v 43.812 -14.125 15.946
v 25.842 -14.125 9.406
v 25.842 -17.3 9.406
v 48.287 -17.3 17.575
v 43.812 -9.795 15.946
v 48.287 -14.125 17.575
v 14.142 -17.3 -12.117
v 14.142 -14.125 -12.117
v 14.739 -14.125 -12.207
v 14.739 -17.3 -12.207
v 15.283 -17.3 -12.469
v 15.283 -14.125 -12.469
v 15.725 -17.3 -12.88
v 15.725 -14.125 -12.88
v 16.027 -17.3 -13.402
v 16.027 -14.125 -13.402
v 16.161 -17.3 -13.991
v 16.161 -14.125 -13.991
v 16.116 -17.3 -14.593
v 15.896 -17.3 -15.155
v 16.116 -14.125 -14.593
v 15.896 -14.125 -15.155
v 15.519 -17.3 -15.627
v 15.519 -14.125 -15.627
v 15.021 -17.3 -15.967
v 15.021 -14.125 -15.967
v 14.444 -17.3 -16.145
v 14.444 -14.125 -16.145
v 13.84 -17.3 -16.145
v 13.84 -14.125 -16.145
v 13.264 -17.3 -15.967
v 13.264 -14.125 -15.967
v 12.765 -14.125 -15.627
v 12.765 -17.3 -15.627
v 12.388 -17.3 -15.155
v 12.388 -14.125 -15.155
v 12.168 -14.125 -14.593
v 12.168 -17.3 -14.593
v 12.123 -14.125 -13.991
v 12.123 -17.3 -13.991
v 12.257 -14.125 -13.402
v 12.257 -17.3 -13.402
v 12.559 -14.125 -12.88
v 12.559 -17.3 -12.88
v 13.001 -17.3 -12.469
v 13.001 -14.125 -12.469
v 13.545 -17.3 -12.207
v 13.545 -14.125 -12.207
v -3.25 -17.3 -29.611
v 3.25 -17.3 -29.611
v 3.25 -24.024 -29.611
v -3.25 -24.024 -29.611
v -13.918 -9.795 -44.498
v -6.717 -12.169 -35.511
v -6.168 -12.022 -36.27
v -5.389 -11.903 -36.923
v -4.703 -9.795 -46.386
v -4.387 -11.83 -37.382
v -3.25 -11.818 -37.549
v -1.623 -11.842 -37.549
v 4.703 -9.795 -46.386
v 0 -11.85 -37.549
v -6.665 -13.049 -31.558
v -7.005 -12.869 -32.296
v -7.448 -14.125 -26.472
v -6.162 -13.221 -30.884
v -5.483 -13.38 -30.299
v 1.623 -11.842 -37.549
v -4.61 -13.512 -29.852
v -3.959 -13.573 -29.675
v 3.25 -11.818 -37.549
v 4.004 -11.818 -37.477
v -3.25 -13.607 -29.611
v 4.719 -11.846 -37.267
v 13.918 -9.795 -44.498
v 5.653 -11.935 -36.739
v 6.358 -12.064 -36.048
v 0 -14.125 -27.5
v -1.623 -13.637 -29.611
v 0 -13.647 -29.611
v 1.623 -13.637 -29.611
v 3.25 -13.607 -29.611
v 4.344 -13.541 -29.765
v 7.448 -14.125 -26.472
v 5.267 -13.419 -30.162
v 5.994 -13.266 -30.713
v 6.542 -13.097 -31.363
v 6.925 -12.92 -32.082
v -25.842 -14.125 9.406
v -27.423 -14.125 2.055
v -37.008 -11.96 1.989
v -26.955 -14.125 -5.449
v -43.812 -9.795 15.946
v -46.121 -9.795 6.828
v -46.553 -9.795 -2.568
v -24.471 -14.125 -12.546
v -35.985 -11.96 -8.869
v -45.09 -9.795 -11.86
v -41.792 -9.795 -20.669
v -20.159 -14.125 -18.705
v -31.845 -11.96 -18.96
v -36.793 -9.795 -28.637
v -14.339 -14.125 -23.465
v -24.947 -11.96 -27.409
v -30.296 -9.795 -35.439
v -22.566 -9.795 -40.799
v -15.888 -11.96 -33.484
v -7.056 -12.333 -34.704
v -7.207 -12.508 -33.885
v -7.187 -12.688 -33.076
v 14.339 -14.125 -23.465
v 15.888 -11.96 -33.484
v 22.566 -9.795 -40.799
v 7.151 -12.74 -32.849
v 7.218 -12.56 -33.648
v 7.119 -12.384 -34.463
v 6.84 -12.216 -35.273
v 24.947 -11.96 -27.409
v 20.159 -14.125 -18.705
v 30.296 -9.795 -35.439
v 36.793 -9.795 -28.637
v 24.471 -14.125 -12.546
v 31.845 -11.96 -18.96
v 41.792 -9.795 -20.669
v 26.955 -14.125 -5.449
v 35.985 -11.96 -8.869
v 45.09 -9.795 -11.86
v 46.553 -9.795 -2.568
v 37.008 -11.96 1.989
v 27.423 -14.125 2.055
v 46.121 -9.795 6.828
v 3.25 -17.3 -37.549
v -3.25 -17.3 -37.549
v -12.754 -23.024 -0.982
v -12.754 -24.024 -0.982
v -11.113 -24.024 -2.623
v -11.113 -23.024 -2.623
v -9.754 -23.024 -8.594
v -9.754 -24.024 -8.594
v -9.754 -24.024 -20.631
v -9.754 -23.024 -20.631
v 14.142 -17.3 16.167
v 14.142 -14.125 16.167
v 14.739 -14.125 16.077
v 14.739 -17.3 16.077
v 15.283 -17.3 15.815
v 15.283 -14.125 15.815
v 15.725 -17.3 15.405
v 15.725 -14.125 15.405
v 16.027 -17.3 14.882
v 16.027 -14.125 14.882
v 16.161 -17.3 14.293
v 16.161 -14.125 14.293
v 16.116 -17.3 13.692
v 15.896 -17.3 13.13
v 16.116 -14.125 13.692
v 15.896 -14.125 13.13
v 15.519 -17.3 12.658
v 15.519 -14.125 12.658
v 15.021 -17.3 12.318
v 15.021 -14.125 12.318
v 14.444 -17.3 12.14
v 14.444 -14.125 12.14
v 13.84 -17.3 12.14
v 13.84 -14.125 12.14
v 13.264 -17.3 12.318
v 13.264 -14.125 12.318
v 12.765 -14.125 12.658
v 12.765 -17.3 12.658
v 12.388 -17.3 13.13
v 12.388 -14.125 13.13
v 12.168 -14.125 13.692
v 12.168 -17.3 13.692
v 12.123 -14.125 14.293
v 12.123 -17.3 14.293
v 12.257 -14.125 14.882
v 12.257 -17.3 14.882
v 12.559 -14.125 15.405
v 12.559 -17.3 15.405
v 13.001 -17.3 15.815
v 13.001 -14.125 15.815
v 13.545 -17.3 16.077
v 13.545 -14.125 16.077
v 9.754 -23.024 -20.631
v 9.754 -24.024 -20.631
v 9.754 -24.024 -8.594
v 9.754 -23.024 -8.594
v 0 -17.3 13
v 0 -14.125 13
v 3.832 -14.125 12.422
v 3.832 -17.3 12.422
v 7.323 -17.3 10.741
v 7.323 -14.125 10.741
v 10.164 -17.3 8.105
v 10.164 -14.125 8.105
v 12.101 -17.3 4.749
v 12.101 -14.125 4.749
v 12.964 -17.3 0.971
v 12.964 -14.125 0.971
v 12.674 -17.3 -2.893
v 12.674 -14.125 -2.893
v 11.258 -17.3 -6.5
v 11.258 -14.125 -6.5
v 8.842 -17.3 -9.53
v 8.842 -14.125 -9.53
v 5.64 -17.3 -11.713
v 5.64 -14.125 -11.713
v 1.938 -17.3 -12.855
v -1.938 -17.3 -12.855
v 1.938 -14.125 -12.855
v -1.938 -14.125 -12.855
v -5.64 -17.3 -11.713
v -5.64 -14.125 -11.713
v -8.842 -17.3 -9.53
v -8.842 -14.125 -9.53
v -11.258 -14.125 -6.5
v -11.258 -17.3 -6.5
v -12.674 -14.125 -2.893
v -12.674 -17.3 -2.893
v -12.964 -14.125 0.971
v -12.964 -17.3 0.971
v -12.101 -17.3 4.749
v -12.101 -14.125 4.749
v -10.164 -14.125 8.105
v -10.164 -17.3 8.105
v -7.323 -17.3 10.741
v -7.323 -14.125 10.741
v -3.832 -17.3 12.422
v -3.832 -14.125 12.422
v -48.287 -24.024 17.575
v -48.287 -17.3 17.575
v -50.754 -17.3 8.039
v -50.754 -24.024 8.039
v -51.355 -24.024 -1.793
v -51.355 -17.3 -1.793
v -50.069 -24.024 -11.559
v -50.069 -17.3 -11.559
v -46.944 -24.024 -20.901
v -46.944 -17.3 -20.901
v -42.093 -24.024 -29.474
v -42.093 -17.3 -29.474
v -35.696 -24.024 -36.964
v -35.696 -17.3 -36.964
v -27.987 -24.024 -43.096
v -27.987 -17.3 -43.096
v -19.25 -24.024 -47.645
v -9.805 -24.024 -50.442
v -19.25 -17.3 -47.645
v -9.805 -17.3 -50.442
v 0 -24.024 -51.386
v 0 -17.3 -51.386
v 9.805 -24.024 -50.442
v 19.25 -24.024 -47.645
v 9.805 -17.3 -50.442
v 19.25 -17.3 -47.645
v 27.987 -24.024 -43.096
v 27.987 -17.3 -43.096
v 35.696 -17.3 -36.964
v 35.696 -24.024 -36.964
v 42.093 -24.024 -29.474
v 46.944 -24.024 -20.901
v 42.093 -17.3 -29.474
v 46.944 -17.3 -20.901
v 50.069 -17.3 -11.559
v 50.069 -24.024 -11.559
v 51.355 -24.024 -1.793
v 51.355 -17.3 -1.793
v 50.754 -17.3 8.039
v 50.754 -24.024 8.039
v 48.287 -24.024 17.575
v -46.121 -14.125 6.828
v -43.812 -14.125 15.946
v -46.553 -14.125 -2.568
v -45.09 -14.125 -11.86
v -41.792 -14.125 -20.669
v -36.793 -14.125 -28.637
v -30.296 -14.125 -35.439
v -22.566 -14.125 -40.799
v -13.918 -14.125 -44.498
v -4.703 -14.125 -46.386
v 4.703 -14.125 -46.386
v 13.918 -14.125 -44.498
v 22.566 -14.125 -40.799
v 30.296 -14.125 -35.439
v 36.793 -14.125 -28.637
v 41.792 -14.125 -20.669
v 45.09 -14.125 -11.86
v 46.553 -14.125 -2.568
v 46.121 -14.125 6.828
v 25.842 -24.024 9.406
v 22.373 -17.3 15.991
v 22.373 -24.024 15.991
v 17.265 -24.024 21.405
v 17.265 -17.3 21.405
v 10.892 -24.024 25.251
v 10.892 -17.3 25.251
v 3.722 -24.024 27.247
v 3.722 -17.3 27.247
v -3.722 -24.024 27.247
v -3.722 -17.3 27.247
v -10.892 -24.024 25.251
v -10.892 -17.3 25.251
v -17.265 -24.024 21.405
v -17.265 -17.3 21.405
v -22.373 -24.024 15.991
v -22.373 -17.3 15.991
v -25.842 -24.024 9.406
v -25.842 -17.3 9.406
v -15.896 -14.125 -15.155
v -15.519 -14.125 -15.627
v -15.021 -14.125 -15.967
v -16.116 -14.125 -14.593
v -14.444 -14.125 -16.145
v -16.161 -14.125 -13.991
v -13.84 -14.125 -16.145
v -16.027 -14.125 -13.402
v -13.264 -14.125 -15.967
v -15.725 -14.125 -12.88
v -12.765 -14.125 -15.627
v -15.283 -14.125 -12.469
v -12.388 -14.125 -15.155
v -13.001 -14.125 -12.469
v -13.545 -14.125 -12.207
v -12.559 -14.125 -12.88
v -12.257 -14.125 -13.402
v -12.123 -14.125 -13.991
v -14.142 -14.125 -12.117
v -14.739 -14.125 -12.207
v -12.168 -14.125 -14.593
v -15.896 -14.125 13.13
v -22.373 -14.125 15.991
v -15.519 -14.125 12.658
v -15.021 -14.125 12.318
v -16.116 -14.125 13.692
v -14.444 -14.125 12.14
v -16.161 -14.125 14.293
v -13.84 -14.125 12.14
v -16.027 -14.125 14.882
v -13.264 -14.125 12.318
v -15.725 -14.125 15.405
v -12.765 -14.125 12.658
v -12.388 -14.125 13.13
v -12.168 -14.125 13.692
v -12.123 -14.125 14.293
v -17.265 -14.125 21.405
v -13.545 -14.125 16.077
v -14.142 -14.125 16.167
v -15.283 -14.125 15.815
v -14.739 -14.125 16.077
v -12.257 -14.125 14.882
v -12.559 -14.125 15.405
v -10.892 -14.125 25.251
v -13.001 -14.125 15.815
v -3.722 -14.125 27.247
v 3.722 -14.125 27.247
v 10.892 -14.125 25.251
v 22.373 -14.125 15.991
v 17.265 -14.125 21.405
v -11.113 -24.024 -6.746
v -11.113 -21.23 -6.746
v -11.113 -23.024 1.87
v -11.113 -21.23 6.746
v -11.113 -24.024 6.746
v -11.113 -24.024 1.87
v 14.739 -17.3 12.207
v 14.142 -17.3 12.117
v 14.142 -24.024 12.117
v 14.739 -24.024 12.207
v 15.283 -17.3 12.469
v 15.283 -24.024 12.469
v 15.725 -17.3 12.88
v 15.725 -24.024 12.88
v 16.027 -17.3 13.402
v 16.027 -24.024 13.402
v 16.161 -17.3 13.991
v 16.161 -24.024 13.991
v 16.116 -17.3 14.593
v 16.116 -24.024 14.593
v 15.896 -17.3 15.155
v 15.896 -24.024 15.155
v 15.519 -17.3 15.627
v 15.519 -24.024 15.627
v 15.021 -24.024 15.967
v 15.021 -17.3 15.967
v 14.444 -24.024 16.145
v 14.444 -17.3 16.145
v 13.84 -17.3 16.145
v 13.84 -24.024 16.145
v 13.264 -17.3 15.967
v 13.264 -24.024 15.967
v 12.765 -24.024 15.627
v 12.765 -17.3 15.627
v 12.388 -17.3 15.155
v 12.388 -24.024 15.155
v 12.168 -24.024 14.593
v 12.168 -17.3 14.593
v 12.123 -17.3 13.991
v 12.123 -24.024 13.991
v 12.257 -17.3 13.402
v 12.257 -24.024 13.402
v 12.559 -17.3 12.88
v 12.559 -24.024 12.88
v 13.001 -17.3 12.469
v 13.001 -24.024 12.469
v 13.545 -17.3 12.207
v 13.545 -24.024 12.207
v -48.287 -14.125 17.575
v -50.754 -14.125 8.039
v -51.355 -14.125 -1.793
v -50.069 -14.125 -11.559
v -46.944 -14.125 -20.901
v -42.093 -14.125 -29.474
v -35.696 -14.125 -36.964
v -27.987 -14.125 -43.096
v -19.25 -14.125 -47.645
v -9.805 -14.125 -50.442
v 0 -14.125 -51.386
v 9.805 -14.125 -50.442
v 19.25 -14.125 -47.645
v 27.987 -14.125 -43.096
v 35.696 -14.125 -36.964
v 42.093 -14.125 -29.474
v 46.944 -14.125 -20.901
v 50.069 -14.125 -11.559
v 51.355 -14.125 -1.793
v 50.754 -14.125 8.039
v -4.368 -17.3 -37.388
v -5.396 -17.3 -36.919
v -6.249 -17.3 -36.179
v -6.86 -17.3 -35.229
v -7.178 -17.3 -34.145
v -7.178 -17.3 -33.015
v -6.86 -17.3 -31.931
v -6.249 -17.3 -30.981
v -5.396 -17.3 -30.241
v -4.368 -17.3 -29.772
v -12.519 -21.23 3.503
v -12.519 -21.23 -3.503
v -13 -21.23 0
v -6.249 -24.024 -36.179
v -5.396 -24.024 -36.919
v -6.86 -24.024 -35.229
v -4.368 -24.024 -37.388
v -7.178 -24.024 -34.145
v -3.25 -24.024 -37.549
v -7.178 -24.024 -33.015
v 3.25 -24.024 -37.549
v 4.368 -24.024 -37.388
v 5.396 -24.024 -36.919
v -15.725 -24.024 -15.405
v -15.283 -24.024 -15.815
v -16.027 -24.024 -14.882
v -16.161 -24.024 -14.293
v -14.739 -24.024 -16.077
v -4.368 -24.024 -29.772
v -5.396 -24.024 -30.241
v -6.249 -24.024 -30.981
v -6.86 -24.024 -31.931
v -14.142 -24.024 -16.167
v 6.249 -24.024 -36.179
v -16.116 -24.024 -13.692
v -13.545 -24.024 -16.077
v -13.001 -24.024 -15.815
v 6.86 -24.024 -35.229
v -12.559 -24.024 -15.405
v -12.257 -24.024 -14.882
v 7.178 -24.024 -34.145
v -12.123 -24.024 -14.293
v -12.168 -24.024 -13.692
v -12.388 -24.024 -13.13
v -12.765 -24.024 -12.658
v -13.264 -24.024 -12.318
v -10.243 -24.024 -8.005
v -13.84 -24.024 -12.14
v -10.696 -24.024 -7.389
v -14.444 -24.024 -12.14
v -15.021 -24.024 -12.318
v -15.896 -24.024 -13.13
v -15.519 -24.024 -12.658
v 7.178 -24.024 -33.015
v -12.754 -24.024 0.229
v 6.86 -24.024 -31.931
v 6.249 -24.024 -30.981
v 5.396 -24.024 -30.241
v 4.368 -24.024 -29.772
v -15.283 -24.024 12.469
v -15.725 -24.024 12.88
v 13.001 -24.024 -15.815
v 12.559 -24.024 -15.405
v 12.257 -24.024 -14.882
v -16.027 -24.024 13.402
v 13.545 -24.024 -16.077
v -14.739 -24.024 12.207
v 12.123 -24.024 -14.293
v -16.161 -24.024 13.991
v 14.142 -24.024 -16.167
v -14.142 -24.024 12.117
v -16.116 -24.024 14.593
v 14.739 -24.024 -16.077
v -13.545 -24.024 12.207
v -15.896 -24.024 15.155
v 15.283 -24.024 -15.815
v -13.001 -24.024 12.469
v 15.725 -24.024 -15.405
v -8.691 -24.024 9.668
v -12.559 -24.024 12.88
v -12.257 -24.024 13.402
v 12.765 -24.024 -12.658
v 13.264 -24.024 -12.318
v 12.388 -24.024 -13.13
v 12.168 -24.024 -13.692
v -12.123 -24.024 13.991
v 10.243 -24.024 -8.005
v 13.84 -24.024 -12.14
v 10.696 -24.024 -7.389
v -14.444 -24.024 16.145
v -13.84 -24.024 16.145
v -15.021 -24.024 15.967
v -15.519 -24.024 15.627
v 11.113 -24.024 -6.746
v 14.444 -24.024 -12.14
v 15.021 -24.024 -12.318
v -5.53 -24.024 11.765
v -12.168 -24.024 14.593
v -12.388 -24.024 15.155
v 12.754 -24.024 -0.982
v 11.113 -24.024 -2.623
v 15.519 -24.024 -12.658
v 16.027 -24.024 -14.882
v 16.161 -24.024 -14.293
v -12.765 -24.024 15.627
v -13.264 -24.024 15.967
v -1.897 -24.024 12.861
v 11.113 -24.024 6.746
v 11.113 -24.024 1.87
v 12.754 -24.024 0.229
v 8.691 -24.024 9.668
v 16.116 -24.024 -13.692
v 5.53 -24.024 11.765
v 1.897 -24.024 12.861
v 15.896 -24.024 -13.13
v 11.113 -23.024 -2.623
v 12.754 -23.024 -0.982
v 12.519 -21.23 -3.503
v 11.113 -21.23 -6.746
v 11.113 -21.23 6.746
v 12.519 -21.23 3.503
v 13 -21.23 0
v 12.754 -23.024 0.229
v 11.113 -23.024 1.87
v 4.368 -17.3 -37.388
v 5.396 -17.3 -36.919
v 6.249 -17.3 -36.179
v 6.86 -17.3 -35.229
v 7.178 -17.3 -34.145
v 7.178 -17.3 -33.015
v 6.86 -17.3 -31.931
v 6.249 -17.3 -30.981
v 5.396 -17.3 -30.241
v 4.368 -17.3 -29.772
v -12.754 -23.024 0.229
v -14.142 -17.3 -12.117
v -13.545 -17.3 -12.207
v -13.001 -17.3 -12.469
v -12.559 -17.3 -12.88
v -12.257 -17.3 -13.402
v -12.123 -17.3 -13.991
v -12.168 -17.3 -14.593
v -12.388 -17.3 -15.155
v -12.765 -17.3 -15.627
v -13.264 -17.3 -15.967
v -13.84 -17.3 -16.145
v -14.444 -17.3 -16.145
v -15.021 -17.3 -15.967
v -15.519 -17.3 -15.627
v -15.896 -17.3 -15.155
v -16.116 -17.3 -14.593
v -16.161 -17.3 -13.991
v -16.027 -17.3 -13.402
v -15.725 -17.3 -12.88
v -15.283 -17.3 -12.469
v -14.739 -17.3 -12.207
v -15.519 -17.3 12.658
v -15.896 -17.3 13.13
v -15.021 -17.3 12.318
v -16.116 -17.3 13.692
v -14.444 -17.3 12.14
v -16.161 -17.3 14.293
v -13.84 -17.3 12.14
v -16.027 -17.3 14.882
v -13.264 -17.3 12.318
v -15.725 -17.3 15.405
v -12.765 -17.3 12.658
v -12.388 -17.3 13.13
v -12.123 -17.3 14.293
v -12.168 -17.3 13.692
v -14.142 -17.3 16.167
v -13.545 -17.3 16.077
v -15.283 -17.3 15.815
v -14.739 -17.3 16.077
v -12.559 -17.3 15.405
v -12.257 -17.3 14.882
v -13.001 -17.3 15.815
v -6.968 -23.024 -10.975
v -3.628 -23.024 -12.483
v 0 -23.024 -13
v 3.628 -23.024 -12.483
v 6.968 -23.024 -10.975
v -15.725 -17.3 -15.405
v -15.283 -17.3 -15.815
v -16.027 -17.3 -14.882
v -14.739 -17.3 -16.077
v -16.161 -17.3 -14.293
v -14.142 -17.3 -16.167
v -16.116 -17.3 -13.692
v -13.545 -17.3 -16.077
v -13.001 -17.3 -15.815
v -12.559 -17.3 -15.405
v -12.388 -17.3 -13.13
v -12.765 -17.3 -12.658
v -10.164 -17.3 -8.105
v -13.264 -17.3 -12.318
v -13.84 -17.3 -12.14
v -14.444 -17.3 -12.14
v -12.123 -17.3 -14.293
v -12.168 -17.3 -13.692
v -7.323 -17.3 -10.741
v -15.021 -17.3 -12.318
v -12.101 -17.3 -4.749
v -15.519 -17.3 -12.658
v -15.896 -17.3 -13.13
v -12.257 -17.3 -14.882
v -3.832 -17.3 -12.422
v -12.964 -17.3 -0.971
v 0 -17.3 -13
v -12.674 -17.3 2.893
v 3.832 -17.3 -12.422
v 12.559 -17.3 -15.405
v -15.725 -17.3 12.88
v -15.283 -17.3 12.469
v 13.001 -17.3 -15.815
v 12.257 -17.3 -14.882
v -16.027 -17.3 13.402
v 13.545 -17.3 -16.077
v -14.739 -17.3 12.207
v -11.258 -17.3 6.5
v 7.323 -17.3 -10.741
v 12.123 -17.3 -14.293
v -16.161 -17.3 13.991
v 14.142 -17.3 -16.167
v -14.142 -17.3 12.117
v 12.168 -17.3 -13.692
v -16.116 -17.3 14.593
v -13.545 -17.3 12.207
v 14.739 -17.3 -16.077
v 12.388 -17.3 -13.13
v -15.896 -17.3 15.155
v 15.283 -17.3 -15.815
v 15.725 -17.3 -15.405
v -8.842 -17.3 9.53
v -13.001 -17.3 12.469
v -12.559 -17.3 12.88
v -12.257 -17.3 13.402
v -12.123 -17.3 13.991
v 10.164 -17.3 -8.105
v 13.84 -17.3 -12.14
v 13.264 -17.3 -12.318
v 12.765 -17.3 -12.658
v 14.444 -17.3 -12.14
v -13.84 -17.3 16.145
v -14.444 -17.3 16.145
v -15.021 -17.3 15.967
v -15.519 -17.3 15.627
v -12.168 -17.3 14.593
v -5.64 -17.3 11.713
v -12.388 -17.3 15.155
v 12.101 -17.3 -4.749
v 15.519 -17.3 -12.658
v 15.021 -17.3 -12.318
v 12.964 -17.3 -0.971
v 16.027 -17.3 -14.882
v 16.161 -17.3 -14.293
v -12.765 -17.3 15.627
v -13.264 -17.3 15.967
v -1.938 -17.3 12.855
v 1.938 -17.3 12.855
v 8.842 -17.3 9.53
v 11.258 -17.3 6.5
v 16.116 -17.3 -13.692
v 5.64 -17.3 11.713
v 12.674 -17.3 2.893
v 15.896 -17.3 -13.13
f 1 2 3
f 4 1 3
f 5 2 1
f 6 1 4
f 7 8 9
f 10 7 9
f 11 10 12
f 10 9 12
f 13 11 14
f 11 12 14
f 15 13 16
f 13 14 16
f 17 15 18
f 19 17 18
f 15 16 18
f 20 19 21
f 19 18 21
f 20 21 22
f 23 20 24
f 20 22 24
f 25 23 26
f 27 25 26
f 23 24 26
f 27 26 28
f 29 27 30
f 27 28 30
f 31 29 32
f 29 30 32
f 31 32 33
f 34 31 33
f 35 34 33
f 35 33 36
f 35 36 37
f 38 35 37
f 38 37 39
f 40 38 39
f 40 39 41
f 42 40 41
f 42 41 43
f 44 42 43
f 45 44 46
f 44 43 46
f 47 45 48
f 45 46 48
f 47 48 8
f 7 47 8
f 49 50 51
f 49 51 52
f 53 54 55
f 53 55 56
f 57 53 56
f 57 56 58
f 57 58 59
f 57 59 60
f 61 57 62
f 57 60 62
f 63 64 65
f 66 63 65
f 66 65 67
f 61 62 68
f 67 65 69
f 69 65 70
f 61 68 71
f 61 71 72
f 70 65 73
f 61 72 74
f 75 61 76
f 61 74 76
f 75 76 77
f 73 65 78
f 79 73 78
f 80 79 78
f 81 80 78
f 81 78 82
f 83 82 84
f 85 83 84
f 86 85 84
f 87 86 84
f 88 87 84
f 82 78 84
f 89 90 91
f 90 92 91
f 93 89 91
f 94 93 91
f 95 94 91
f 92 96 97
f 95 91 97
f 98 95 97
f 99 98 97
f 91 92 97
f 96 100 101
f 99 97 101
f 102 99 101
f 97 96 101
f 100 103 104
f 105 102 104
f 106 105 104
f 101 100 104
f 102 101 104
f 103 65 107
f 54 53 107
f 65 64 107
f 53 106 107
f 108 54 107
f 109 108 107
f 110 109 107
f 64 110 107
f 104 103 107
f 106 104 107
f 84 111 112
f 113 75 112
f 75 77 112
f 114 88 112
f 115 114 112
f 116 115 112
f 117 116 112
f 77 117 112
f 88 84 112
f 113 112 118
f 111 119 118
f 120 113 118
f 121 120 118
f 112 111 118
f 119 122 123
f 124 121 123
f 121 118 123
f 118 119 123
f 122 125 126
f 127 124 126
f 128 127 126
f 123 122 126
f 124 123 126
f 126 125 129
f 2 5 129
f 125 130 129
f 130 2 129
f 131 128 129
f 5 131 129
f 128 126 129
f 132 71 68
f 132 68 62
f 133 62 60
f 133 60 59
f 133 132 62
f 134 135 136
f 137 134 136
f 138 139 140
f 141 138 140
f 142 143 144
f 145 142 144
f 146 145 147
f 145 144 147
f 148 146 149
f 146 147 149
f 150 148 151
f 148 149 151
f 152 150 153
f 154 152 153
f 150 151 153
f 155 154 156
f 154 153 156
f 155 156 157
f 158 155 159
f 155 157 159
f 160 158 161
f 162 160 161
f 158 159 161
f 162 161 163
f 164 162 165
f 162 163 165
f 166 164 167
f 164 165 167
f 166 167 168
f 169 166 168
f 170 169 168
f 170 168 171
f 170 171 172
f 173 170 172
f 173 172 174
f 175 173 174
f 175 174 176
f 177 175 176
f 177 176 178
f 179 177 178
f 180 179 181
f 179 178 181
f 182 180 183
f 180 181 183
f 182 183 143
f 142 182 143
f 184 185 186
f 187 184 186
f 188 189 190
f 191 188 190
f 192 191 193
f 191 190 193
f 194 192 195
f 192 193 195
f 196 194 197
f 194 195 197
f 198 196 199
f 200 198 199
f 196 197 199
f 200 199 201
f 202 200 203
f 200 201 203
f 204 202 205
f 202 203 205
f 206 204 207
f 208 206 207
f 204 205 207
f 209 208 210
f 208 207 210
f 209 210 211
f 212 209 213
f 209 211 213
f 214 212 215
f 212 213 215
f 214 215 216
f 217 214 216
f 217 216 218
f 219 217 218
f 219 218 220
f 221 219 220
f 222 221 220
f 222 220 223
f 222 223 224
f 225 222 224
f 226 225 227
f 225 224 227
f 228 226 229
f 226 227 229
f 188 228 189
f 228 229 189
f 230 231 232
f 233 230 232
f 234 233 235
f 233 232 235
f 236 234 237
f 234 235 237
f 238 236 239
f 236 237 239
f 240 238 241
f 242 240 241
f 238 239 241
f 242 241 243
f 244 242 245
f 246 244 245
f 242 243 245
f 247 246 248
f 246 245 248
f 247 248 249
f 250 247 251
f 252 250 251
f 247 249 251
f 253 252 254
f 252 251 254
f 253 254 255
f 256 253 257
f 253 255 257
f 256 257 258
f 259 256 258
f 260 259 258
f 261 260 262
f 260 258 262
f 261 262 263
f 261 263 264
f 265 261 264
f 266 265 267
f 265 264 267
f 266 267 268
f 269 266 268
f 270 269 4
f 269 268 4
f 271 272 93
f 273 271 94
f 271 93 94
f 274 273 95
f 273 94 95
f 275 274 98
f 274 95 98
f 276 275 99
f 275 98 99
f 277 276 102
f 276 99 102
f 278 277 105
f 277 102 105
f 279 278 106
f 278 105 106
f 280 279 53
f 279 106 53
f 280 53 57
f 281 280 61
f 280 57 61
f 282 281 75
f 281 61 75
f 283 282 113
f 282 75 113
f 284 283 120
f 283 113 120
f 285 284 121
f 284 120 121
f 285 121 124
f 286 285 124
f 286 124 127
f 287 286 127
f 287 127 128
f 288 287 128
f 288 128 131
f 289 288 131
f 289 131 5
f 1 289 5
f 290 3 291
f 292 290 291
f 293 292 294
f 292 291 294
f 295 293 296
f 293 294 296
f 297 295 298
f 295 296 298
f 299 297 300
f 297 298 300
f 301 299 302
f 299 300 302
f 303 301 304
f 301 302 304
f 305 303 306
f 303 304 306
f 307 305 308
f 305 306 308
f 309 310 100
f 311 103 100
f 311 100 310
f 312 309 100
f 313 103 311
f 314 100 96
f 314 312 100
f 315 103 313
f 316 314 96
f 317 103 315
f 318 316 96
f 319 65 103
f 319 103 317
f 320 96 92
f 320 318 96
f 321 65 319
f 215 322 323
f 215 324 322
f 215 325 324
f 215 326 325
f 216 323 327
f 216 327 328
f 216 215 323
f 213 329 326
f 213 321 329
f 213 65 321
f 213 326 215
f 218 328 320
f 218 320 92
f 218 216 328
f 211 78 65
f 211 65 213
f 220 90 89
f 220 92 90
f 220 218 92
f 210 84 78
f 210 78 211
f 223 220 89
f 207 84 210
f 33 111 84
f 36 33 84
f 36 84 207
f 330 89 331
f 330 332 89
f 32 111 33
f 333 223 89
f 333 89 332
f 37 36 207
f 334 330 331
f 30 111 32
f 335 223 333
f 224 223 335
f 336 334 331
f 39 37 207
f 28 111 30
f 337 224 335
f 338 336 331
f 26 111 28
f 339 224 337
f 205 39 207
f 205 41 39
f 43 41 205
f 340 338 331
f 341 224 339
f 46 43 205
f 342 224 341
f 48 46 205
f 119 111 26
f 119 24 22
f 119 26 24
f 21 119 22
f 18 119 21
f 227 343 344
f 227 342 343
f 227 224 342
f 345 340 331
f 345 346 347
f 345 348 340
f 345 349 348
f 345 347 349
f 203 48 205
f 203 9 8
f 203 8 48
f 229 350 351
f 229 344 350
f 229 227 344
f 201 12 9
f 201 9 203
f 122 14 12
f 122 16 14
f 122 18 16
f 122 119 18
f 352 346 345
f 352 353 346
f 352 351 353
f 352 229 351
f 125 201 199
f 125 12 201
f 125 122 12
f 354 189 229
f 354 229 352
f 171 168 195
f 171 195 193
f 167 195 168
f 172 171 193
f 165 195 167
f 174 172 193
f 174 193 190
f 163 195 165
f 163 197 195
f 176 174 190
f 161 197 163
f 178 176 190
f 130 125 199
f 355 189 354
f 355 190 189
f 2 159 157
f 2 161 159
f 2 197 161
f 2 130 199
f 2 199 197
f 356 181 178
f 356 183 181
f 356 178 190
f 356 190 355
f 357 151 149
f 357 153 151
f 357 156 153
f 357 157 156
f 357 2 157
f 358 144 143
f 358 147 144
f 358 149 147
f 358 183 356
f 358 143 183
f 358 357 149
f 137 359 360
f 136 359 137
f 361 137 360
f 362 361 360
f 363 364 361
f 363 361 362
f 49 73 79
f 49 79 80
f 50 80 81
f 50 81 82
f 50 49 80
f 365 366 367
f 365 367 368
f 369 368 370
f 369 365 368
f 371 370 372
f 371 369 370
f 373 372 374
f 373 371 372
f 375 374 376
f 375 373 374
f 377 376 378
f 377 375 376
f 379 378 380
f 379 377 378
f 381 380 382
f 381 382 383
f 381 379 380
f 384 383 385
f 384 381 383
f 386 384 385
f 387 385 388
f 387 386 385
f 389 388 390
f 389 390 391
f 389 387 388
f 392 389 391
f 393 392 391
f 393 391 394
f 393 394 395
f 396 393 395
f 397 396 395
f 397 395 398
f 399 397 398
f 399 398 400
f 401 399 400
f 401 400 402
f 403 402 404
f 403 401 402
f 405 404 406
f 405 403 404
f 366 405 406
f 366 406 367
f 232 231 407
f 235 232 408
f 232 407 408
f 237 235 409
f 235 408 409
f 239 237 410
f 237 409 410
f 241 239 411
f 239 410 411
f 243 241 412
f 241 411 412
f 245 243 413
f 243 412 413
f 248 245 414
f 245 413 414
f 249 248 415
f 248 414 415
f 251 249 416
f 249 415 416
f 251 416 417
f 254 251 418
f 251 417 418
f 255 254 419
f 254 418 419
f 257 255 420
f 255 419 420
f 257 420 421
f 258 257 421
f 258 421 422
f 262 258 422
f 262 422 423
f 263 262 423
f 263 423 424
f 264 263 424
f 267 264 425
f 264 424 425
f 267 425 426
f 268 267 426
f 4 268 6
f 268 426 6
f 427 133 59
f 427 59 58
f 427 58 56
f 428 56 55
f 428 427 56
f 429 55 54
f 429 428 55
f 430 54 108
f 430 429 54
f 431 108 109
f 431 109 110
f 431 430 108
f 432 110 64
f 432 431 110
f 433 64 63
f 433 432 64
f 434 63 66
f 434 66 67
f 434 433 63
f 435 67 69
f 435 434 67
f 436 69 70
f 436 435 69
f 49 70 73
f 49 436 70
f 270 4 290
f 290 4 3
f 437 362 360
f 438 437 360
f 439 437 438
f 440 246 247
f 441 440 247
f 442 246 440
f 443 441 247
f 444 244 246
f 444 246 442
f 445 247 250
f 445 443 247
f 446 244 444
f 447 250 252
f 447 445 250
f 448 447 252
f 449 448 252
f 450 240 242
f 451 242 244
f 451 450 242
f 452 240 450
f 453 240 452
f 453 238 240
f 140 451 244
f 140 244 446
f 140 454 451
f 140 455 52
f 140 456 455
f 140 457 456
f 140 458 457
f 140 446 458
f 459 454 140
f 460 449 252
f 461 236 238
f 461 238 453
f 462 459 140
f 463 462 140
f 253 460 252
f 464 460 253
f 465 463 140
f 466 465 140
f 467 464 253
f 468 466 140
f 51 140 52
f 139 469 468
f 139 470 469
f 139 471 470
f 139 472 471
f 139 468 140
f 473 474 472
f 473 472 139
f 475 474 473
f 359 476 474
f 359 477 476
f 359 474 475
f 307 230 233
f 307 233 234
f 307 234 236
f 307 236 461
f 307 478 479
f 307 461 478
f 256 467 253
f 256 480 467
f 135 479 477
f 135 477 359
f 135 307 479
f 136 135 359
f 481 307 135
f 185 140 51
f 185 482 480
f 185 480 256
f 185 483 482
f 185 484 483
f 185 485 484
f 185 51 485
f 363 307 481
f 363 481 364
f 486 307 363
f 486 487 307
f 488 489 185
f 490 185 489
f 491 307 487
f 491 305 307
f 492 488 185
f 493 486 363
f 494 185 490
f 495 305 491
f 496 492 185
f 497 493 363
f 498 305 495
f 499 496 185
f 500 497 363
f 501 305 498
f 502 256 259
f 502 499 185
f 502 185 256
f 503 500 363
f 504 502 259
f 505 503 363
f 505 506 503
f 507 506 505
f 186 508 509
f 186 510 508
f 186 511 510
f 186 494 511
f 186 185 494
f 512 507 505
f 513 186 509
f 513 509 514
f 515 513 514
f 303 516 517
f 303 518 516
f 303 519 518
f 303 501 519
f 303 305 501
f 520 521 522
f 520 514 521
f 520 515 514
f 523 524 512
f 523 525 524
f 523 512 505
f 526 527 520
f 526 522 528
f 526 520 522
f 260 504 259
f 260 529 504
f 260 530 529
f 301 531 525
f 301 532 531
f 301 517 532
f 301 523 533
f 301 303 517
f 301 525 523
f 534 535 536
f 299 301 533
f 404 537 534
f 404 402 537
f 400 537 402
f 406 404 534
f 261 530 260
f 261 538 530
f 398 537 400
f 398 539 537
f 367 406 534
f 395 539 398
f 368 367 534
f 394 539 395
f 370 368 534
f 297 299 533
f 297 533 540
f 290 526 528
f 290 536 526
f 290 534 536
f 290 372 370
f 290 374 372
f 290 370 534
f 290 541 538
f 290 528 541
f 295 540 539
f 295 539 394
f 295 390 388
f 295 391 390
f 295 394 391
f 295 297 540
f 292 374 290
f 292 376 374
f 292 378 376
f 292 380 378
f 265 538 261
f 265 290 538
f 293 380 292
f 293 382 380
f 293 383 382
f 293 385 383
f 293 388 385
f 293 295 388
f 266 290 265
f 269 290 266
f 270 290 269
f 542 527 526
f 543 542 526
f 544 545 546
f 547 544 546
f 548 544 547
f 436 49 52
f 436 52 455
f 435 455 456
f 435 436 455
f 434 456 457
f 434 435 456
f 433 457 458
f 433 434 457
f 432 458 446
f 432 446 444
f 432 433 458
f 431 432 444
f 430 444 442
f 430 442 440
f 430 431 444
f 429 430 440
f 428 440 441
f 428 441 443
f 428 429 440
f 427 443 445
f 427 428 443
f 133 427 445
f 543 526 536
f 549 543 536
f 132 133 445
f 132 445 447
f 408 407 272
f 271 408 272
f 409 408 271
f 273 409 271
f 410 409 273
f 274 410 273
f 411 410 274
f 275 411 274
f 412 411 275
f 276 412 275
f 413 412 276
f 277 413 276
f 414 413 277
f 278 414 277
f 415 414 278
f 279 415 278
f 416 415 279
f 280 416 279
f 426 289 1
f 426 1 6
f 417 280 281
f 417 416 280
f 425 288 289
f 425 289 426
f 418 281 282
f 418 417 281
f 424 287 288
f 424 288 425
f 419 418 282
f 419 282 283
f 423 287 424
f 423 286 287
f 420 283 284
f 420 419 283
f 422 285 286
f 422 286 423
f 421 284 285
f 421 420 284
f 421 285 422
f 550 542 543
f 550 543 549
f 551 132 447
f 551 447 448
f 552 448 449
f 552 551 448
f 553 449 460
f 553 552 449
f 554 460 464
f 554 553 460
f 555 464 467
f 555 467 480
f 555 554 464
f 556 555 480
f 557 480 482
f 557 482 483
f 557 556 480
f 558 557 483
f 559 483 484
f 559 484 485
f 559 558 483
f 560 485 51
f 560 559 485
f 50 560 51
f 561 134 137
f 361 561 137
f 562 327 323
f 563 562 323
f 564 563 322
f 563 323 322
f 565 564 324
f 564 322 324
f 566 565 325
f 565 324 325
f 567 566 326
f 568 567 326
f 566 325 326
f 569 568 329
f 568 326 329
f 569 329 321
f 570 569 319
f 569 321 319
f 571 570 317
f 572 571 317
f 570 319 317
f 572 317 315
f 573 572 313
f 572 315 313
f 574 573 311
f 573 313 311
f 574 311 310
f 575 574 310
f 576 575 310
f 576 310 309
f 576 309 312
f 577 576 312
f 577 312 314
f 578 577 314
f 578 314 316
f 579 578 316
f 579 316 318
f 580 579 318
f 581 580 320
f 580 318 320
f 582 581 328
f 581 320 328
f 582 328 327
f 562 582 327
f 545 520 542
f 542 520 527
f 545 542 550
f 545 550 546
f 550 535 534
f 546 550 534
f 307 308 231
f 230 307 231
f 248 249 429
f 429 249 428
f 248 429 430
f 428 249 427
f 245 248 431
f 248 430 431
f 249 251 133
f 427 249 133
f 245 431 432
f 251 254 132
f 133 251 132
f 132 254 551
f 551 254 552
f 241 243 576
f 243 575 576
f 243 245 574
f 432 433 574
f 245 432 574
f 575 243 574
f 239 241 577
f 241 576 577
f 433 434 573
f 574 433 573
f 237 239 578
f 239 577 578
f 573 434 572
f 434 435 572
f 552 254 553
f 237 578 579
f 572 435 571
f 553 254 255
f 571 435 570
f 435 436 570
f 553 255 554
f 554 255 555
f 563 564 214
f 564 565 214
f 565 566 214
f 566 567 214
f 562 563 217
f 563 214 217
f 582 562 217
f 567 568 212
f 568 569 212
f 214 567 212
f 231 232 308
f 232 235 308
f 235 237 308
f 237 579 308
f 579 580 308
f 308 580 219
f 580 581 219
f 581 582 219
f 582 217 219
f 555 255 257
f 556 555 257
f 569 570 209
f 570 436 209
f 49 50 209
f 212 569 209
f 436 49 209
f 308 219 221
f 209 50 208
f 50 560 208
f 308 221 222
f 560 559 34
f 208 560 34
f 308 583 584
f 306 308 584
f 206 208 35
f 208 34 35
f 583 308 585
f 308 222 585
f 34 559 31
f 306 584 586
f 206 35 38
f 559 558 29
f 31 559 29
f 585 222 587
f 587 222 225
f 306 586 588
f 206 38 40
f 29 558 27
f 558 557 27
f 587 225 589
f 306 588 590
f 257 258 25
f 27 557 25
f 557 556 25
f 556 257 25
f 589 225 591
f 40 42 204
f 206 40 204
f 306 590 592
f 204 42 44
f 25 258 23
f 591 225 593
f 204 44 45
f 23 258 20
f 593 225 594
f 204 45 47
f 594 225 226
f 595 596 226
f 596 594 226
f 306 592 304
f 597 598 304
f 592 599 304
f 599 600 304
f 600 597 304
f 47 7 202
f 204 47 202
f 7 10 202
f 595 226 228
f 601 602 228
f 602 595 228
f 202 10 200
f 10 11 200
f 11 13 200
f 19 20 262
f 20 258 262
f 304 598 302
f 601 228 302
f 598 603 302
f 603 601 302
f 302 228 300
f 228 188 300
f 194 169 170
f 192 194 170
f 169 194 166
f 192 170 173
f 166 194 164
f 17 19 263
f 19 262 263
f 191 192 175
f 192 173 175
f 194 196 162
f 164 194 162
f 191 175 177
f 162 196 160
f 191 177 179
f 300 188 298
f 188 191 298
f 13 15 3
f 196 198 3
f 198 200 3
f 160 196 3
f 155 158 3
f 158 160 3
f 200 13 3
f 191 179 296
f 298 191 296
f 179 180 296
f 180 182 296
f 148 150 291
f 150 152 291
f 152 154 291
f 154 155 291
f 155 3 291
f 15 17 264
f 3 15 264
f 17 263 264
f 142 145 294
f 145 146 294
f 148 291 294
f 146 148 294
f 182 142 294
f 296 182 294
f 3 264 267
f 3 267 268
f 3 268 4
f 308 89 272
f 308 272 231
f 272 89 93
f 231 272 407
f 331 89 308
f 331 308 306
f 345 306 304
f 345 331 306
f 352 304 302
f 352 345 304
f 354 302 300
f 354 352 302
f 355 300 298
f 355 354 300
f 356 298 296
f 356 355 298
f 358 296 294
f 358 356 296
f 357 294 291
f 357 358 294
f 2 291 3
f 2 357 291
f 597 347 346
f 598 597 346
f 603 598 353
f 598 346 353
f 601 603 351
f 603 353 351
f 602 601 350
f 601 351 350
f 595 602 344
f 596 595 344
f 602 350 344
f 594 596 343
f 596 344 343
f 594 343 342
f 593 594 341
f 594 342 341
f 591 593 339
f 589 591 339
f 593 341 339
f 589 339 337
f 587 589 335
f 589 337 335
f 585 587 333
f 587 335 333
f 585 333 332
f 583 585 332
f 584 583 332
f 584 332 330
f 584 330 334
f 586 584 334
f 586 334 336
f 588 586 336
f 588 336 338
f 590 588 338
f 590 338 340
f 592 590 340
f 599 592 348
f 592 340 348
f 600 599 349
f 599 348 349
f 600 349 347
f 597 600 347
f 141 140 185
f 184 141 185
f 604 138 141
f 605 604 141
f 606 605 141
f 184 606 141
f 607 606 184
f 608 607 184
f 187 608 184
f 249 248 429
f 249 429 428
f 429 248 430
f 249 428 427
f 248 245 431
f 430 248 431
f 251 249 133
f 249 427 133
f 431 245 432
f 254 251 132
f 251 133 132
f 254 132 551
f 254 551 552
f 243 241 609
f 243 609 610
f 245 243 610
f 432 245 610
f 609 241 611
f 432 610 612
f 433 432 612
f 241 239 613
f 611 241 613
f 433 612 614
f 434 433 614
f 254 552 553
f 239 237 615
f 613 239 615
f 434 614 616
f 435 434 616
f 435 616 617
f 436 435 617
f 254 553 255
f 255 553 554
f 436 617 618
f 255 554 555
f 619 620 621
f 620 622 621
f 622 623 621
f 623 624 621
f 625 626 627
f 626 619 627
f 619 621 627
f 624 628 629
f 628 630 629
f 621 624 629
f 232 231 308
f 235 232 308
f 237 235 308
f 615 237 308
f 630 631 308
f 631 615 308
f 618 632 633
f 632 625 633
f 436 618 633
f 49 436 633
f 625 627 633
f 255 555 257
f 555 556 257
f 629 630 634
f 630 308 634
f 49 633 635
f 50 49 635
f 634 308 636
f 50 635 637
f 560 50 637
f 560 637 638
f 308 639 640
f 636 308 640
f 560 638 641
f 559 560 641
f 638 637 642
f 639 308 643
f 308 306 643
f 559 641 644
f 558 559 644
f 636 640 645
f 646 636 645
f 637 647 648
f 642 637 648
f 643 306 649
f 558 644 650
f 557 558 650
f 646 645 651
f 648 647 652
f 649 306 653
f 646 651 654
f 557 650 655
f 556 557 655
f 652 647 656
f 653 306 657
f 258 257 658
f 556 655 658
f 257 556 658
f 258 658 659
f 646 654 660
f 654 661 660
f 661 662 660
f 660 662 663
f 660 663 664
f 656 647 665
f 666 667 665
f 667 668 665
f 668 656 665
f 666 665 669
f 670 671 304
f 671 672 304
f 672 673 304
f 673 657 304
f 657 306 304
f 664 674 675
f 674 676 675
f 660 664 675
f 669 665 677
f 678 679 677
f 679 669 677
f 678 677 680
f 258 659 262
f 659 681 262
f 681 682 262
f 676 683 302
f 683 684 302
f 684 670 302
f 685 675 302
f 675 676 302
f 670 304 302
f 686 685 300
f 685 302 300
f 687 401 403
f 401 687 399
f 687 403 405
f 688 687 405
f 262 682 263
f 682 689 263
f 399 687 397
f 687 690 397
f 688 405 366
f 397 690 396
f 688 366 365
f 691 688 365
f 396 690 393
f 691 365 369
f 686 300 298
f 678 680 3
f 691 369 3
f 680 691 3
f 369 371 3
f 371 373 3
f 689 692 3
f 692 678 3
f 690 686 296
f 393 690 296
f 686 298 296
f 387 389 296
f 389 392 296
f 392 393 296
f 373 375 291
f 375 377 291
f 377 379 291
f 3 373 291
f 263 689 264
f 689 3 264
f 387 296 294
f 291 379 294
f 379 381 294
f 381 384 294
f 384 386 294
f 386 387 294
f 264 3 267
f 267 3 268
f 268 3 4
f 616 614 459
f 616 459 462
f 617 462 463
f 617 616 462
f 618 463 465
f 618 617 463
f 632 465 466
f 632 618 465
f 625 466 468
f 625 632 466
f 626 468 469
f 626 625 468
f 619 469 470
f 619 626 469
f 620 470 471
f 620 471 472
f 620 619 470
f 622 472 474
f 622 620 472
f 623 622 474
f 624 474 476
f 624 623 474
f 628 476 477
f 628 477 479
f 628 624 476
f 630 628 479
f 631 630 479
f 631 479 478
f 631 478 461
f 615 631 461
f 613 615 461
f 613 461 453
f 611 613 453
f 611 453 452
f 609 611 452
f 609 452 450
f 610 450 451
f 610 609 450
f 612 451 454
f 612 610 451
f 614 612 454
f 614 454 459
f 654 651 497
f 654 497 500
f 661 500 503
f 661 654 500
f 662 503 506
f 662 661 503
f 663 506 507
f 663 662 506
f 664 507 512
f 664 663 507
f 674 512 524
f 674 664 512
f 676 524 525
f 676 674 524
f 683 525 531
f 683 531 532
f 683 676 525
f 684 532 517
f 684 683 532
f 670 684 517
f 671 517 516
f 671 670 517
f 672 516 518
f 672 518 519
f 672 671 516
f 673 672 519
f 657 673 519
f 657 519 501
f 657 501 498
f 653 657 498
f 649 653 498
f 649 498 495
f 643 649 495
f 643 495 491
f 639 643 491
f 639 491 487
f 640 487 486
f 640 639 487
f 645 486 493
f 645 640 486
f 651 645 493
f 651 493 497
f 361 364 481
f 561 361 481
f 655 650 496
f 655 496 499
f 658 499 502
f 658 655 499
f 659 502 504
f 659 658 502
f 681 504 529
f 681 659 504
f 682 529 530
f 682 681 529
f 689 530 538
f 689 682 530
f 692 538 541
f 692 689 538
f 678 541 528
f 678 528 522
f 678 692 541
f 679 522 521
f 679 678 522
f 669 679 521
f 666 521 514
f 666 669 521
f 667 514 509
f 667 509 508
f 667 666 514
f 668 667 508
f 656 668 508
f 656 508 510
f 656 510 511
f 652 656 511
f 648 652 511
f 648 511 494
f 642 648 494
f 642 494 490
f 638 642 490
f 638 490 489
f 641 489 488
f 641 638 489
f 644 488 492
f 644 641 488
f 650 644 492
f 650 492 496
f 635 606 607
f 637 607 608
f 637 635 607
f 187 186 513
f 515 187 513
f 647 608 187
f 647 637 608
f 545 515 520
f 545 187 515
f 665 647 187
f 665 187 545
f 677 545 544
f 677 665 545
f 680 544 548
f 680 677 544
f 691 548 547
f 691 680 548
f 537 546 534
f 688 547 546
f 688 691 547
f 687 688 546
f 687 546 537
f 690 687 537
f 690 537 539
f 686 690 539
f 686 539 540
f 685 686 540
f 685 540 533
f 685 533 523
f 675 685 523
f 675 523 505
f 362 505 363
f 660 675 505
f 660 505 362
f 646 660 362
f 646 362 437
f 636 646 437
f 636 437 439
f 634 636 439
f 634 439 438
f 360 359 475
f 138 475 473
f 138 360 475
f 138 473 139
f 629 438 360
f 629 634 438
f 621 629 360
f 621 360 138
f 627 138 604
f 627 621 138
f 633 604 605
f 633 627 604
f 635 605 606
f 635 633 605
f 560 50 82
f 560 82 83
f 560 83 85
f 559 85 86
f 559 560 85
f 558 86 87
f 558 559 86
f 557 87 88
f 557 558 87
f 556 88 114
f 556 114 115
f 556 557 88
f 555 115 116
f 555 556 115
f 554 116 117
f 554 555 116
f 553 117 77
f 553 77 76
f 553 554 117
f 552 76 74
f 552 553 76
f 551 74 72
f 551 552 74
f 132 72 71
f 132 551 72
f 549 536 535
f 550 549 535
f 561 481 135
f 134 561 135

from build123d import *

# Parameters (mm, degrees)
BOSS_EXTRUDE1_START = -14.125
SKETCH2_R           = 27.5
SKETCH2_R_2         = 13.000000035
SKETCH2_R_3         = 2.025
BOSS_EXTRUDE1_DEPTH = 3.175
BOSS_EXTRUDE2_START = 28.4275
SKETCH3_R           = 18.35
SKETCH3_R_2         = 12
BOSS_EXTRUDE2_DEPTH = 6
REVOLVE1_ANGLE      = 220
SKETCH5_R           = 18.35
SKETCH5_R_2         = 11.20625
BOSS_EXTRUDE3_DEPTH = 0.79375
CUT_EXTRUDE1_REACH  = 91.201
CUT_EXTRUDE2_DEPTH  = 48.55249997
SKETCH8_R           = 2.025
SKETCH8_R_2         = 13.000000035
BOSS_EXTRUDE4_DEPTH = 6.723750032
SKETCH10_W          = 1.887500035
SKETCH10_H          = 13.492567534
BOSS_EXTRUDE5_DEPTH = 2.793750032
CUT_EXTRUDE3_DEPTH  = 1.000000032


with BuildPart() as part:
    # Sketch2 → Boss-Extrude1 (new body)
    with BuildSketch(Plane(origin=(0, 0, 0), x_dir=(1, 0, 0), z_dir=(0, 1, 0)).offset(BOSS_EXTRUDE1_START)):
        with Locations(Location((0, 0, 0), (0, 0, 270))):
            Circle(SKETCH2_R)
        with Locations(Location((0, 0, 0), (0, 0, 270))):
            Circle(SKETCH2_R_2, mode=Mode.SUBTRACT)
        with Locations(Location((-14.142135624, -14.142135624, 0), (0, 0, 270))):
            Circle(SKETCH2_R_3, mode=Mode.SUBTRACT)
        with Locations(Location((14.142135624, -14.142135624, 0), (0, 0, 270))):
            Circle(SKETCH2_R_3, mode=Mode.SUBTRACT)
        with Locations(Location((14.142135624, 14.142135624, 0), (0, 0, 270))):
            Circle(SKETCH2_R_3, mode=Mode.SUBTRACT)
        with Locations(Location((-14.142135624, 14.142135624, 0), (0, 0, 270))):
            Circle(SKETCH2_R_3, mode=Mode.SUBTRACT)
    extrude(amount=-BOSS_EXTRUDE1_DEPTH)



with BuildPart() as body_2:
    # Sketch3 → Boss-Extrude2 (new body)
    with BuildSketch(Plane(origin=(0, 0, 0), x_dir=(1, 0, 0), z_dir=(0, 1, 0)).offset(BOSS_EXTRUDE2_START)):
        with Locations(Location((0, 0, 0), (0, 0, 270))):
            Circle(SKETCH3_R)
        with Locations(Location((0, 0, 0), (0, 0, 270))):
            Circle(SKETCH3_R_2, mode=Mode.SUBTRACT)
    extrude(amount=BOSS_EXTRUDE2_DEPTH)


with BuildPart() as part_1:
    add(part.part)

    add(body_2.part)  # Revolve1 merges body 2
    # Sketch4 → Revolve1 (revolve, symmetric)
    with BuildSketch(Plane(origin=(0, 0, 0), x_dir=(0, 0, -1), z_dir=(1, 0, 0))) as revolve1_sk:
        Polygon((27.5, -17.3), (51.38625, -17.3), (51.38625, 34.42749997), (18.35, 34.42749997), (18.35, 28.427500017), (46.62375, 28.427500017), (46.62375, -9.795291189), (27.5, -14.125), align=None)
    revolve(axis=Axis((0, -14.125, 0), (0, 1, 0)), revolution_arc=REVOLVE1_ANGLE / 2)
    revolve(revolve1_sk.sketch, axis=Axis((0, -14.125, 0), (0, -1, 0)), revolution_arc=REVOLVE1_ANGLE / 2)

    # Sketch5 → Boss-Extrude3 (add)
    with BuildSketch(Plane.XZ.offset(-28.427500017)):
        with Locations(Location((0, 0, 0), (0, 0, 270))):
            Circle(SKETCH5_R)
        with Locations(Location((0, 0, 0), (0, 0, 270))):
            Circle(SKETCH5_R_2, mode=Mode.SUBTRACT)
    extrude(amount=BOSS_EXTRUDE3_DEPTH)

    # Cut-Extrude1: up to this cone (the profile starts outside it)
    cut_extrude1_end = Plane(origin=(0, -17.3, 0), z_dir=(0, 1, 0)).offset(-3.051131024) * Cone(4.417e-06, 478.031284628, 108.228576807, align=(Align.CENTER, Align.CENTER, Align.MIN), mode=Mode.PRIVATE)
    # Sketch6 → Cut-Extrude1 (cut, up to the surface)
    with BuildSketch(Plane(origin=(0, -17.3, 0), x_dir=(-1, 0, 0), z_dir=(0, -1, 0)), mode=Mode.PRIVATE) as cut_extrude1_sk1:
        with BuildLine():
            Line((3.25, 29.61125), (-3.25, 29.61125))
            ThreePointArc((-3.25, 29.61125), (-7.21875, 33.58), (-3.25, 37.54875))
            Line((-3.25, 37.54875), (3.25, 37.54875))
            ThreePointArc((3.25, 37.54875), (7.21875, 33.58), (3.25, 29.61125))
        make_face()
    cut_extrude1_tool1 = extrude(cut_extrude1_sk1.sketch, amount=-CUT_EXTRUDE1_REACH, mode=Mode.PRIVATE) - cut_extrude1_end
    add(cut_extrude1_tool1.solids().sort_by_distance((0, -17.3, -33.58))[0], mode=Mode.SUBTRACT)

    # Sketch7 → Cut-Extrude2 (cut)
    with BuildSketch(Plane(origin=(0, 34.42749997, 0), x_dir=(1, 0, 0), z_dir=(0, 1, 0))):
        with BuildLine():
            Line((-48.287279935, -17.57513259), (-43.811993828, -15.946261657))
            ThreePointArc((-43.811993828, -15.946261657), (0, 46.62375), (43.811993828, -15.946261657))
            Line((43.811993828, -15.946261657), (48.287279935, -17.57513259))
            ThreePointArc((48.287279935, -17.57513259), (0, 51.38625), (-48.287279935, -17.57513259))
        make_face()
    extrude(amount=-CUT_EXTRUDE2_DEPTH, mode=Mode.SUBTRACT)


with BuildPart() as cut_extrude2_kept_piece:
    # of the separate pieces the step leaves, the one the design keeps (cut_extrude2_pieces_kept)
    add(part_1.part.solids().sort_by_distance((-25.841547072, -14.125, 9.405553941))[0])


with BuildPart() as body_2_2:
    # Sketch8 → Boss-Extrude4 (new body)
    with BuildSketch(Plane.XZ.offset(17.3)):
        with BuildLine():
            Line((-25.841547072, 9.405553941), (-48.287279935, 17.57513259))
            ThreePointArc((-48.287279935, 17.57513259), (0, -51.38625), (48.287279935, 17.57513259))
            Line((48.287279935, 17.57513259), (25.841547072, 9.405553941))
            ThreePointArc((25.841547072, 9.405553941), (0, 27.5), (-25.841547072, 9.405553941))
        make_face()
        with Locations(Location((-14.142135624, -14.142135624, 0), (0, 0, 270))):
            Circle(SKETCH8_R, mode=Mode.SUBTRACT)
        with Locations(Location((14.142135624, -14.142135624, 0), (0, 0, 270))):
            Circle(SKETCH8_R, mode=Mode.SUBTRACT)
        with Locations(Location((14.142135624, 14.142135624, 0), (0, 0, 270))):
            Circle(SKETCH8_R, mode=Mode.SUBTRACT)
        with Locations(Location((-14.142135624, 14.142135624, 0), (0, 0, 270))):
            Circle(SKETCH8_R, mode=Mode.SUBTRACT)
        with Locations(Location((0, 0, 0), (0, 0, 270))):
            Circle(SKETCH8_R_2, mode=Mode.SUBTRACT)
        with BuildLine():
            Line((-3.25, -37.54875), (3.25, -37.54875))
            ThreePointArc((3.25, -37.54875), (7.21875, -33.58), (3.25, -29.61125))
            Line((3.25, -29.61125), (-3.25, -29.61125))
            ThreePointArc((-3.25, -29.61125), (-7.21875, -33.58), (-3.25, -37.54875))
        make_face(mode=Mode.SUBTRACT)
    extrude(amount=BOSS_EXTRUDE4_DEPTH)

    # Sketch10 → Boss-Extrude5 (add)
    with BuildSketch(Plane.XZ.offset(24.023750032)):
        with Locations((-12.056250018, 0)):
            Rectangle(SKETCH10_W, SKETCH10_H)
        with Locations((12.056250018, 0)):
            Rectangle(SKETCH10_W, SKETCH10_H)
    extrude(amount=-BOSS_EXTRUDE5_DEPTH)

    # Sketch12 → Cut-Extrude3 (cut)
    with BuildSketch(Plane.XZ.offset(24.023750032)):
        Polygon((-9.75400005, -3.981786238), (-9.75400005, -20.630576141), (9.75400005, -20.630576141), (9.75400005, -3.981786238), (12.754000146, -0.981786142), (12.754000146, 0.228634125), (9.75400005, 3.228634221), (9.75400005, 4.877423897), (-9.75400005, 4.877423897), (-9.75400005, 3.228634221), (-12.754000146, 0.228634125), (-12.754000146, -0.981786142), align=None)
    extrude(amount=-CUT_EXTRUDE3_DEPTH, mode=Mode.SUBTRACT)


solid = Compound([cut_extrude2_kept_piece.part, body_2_2.part])
